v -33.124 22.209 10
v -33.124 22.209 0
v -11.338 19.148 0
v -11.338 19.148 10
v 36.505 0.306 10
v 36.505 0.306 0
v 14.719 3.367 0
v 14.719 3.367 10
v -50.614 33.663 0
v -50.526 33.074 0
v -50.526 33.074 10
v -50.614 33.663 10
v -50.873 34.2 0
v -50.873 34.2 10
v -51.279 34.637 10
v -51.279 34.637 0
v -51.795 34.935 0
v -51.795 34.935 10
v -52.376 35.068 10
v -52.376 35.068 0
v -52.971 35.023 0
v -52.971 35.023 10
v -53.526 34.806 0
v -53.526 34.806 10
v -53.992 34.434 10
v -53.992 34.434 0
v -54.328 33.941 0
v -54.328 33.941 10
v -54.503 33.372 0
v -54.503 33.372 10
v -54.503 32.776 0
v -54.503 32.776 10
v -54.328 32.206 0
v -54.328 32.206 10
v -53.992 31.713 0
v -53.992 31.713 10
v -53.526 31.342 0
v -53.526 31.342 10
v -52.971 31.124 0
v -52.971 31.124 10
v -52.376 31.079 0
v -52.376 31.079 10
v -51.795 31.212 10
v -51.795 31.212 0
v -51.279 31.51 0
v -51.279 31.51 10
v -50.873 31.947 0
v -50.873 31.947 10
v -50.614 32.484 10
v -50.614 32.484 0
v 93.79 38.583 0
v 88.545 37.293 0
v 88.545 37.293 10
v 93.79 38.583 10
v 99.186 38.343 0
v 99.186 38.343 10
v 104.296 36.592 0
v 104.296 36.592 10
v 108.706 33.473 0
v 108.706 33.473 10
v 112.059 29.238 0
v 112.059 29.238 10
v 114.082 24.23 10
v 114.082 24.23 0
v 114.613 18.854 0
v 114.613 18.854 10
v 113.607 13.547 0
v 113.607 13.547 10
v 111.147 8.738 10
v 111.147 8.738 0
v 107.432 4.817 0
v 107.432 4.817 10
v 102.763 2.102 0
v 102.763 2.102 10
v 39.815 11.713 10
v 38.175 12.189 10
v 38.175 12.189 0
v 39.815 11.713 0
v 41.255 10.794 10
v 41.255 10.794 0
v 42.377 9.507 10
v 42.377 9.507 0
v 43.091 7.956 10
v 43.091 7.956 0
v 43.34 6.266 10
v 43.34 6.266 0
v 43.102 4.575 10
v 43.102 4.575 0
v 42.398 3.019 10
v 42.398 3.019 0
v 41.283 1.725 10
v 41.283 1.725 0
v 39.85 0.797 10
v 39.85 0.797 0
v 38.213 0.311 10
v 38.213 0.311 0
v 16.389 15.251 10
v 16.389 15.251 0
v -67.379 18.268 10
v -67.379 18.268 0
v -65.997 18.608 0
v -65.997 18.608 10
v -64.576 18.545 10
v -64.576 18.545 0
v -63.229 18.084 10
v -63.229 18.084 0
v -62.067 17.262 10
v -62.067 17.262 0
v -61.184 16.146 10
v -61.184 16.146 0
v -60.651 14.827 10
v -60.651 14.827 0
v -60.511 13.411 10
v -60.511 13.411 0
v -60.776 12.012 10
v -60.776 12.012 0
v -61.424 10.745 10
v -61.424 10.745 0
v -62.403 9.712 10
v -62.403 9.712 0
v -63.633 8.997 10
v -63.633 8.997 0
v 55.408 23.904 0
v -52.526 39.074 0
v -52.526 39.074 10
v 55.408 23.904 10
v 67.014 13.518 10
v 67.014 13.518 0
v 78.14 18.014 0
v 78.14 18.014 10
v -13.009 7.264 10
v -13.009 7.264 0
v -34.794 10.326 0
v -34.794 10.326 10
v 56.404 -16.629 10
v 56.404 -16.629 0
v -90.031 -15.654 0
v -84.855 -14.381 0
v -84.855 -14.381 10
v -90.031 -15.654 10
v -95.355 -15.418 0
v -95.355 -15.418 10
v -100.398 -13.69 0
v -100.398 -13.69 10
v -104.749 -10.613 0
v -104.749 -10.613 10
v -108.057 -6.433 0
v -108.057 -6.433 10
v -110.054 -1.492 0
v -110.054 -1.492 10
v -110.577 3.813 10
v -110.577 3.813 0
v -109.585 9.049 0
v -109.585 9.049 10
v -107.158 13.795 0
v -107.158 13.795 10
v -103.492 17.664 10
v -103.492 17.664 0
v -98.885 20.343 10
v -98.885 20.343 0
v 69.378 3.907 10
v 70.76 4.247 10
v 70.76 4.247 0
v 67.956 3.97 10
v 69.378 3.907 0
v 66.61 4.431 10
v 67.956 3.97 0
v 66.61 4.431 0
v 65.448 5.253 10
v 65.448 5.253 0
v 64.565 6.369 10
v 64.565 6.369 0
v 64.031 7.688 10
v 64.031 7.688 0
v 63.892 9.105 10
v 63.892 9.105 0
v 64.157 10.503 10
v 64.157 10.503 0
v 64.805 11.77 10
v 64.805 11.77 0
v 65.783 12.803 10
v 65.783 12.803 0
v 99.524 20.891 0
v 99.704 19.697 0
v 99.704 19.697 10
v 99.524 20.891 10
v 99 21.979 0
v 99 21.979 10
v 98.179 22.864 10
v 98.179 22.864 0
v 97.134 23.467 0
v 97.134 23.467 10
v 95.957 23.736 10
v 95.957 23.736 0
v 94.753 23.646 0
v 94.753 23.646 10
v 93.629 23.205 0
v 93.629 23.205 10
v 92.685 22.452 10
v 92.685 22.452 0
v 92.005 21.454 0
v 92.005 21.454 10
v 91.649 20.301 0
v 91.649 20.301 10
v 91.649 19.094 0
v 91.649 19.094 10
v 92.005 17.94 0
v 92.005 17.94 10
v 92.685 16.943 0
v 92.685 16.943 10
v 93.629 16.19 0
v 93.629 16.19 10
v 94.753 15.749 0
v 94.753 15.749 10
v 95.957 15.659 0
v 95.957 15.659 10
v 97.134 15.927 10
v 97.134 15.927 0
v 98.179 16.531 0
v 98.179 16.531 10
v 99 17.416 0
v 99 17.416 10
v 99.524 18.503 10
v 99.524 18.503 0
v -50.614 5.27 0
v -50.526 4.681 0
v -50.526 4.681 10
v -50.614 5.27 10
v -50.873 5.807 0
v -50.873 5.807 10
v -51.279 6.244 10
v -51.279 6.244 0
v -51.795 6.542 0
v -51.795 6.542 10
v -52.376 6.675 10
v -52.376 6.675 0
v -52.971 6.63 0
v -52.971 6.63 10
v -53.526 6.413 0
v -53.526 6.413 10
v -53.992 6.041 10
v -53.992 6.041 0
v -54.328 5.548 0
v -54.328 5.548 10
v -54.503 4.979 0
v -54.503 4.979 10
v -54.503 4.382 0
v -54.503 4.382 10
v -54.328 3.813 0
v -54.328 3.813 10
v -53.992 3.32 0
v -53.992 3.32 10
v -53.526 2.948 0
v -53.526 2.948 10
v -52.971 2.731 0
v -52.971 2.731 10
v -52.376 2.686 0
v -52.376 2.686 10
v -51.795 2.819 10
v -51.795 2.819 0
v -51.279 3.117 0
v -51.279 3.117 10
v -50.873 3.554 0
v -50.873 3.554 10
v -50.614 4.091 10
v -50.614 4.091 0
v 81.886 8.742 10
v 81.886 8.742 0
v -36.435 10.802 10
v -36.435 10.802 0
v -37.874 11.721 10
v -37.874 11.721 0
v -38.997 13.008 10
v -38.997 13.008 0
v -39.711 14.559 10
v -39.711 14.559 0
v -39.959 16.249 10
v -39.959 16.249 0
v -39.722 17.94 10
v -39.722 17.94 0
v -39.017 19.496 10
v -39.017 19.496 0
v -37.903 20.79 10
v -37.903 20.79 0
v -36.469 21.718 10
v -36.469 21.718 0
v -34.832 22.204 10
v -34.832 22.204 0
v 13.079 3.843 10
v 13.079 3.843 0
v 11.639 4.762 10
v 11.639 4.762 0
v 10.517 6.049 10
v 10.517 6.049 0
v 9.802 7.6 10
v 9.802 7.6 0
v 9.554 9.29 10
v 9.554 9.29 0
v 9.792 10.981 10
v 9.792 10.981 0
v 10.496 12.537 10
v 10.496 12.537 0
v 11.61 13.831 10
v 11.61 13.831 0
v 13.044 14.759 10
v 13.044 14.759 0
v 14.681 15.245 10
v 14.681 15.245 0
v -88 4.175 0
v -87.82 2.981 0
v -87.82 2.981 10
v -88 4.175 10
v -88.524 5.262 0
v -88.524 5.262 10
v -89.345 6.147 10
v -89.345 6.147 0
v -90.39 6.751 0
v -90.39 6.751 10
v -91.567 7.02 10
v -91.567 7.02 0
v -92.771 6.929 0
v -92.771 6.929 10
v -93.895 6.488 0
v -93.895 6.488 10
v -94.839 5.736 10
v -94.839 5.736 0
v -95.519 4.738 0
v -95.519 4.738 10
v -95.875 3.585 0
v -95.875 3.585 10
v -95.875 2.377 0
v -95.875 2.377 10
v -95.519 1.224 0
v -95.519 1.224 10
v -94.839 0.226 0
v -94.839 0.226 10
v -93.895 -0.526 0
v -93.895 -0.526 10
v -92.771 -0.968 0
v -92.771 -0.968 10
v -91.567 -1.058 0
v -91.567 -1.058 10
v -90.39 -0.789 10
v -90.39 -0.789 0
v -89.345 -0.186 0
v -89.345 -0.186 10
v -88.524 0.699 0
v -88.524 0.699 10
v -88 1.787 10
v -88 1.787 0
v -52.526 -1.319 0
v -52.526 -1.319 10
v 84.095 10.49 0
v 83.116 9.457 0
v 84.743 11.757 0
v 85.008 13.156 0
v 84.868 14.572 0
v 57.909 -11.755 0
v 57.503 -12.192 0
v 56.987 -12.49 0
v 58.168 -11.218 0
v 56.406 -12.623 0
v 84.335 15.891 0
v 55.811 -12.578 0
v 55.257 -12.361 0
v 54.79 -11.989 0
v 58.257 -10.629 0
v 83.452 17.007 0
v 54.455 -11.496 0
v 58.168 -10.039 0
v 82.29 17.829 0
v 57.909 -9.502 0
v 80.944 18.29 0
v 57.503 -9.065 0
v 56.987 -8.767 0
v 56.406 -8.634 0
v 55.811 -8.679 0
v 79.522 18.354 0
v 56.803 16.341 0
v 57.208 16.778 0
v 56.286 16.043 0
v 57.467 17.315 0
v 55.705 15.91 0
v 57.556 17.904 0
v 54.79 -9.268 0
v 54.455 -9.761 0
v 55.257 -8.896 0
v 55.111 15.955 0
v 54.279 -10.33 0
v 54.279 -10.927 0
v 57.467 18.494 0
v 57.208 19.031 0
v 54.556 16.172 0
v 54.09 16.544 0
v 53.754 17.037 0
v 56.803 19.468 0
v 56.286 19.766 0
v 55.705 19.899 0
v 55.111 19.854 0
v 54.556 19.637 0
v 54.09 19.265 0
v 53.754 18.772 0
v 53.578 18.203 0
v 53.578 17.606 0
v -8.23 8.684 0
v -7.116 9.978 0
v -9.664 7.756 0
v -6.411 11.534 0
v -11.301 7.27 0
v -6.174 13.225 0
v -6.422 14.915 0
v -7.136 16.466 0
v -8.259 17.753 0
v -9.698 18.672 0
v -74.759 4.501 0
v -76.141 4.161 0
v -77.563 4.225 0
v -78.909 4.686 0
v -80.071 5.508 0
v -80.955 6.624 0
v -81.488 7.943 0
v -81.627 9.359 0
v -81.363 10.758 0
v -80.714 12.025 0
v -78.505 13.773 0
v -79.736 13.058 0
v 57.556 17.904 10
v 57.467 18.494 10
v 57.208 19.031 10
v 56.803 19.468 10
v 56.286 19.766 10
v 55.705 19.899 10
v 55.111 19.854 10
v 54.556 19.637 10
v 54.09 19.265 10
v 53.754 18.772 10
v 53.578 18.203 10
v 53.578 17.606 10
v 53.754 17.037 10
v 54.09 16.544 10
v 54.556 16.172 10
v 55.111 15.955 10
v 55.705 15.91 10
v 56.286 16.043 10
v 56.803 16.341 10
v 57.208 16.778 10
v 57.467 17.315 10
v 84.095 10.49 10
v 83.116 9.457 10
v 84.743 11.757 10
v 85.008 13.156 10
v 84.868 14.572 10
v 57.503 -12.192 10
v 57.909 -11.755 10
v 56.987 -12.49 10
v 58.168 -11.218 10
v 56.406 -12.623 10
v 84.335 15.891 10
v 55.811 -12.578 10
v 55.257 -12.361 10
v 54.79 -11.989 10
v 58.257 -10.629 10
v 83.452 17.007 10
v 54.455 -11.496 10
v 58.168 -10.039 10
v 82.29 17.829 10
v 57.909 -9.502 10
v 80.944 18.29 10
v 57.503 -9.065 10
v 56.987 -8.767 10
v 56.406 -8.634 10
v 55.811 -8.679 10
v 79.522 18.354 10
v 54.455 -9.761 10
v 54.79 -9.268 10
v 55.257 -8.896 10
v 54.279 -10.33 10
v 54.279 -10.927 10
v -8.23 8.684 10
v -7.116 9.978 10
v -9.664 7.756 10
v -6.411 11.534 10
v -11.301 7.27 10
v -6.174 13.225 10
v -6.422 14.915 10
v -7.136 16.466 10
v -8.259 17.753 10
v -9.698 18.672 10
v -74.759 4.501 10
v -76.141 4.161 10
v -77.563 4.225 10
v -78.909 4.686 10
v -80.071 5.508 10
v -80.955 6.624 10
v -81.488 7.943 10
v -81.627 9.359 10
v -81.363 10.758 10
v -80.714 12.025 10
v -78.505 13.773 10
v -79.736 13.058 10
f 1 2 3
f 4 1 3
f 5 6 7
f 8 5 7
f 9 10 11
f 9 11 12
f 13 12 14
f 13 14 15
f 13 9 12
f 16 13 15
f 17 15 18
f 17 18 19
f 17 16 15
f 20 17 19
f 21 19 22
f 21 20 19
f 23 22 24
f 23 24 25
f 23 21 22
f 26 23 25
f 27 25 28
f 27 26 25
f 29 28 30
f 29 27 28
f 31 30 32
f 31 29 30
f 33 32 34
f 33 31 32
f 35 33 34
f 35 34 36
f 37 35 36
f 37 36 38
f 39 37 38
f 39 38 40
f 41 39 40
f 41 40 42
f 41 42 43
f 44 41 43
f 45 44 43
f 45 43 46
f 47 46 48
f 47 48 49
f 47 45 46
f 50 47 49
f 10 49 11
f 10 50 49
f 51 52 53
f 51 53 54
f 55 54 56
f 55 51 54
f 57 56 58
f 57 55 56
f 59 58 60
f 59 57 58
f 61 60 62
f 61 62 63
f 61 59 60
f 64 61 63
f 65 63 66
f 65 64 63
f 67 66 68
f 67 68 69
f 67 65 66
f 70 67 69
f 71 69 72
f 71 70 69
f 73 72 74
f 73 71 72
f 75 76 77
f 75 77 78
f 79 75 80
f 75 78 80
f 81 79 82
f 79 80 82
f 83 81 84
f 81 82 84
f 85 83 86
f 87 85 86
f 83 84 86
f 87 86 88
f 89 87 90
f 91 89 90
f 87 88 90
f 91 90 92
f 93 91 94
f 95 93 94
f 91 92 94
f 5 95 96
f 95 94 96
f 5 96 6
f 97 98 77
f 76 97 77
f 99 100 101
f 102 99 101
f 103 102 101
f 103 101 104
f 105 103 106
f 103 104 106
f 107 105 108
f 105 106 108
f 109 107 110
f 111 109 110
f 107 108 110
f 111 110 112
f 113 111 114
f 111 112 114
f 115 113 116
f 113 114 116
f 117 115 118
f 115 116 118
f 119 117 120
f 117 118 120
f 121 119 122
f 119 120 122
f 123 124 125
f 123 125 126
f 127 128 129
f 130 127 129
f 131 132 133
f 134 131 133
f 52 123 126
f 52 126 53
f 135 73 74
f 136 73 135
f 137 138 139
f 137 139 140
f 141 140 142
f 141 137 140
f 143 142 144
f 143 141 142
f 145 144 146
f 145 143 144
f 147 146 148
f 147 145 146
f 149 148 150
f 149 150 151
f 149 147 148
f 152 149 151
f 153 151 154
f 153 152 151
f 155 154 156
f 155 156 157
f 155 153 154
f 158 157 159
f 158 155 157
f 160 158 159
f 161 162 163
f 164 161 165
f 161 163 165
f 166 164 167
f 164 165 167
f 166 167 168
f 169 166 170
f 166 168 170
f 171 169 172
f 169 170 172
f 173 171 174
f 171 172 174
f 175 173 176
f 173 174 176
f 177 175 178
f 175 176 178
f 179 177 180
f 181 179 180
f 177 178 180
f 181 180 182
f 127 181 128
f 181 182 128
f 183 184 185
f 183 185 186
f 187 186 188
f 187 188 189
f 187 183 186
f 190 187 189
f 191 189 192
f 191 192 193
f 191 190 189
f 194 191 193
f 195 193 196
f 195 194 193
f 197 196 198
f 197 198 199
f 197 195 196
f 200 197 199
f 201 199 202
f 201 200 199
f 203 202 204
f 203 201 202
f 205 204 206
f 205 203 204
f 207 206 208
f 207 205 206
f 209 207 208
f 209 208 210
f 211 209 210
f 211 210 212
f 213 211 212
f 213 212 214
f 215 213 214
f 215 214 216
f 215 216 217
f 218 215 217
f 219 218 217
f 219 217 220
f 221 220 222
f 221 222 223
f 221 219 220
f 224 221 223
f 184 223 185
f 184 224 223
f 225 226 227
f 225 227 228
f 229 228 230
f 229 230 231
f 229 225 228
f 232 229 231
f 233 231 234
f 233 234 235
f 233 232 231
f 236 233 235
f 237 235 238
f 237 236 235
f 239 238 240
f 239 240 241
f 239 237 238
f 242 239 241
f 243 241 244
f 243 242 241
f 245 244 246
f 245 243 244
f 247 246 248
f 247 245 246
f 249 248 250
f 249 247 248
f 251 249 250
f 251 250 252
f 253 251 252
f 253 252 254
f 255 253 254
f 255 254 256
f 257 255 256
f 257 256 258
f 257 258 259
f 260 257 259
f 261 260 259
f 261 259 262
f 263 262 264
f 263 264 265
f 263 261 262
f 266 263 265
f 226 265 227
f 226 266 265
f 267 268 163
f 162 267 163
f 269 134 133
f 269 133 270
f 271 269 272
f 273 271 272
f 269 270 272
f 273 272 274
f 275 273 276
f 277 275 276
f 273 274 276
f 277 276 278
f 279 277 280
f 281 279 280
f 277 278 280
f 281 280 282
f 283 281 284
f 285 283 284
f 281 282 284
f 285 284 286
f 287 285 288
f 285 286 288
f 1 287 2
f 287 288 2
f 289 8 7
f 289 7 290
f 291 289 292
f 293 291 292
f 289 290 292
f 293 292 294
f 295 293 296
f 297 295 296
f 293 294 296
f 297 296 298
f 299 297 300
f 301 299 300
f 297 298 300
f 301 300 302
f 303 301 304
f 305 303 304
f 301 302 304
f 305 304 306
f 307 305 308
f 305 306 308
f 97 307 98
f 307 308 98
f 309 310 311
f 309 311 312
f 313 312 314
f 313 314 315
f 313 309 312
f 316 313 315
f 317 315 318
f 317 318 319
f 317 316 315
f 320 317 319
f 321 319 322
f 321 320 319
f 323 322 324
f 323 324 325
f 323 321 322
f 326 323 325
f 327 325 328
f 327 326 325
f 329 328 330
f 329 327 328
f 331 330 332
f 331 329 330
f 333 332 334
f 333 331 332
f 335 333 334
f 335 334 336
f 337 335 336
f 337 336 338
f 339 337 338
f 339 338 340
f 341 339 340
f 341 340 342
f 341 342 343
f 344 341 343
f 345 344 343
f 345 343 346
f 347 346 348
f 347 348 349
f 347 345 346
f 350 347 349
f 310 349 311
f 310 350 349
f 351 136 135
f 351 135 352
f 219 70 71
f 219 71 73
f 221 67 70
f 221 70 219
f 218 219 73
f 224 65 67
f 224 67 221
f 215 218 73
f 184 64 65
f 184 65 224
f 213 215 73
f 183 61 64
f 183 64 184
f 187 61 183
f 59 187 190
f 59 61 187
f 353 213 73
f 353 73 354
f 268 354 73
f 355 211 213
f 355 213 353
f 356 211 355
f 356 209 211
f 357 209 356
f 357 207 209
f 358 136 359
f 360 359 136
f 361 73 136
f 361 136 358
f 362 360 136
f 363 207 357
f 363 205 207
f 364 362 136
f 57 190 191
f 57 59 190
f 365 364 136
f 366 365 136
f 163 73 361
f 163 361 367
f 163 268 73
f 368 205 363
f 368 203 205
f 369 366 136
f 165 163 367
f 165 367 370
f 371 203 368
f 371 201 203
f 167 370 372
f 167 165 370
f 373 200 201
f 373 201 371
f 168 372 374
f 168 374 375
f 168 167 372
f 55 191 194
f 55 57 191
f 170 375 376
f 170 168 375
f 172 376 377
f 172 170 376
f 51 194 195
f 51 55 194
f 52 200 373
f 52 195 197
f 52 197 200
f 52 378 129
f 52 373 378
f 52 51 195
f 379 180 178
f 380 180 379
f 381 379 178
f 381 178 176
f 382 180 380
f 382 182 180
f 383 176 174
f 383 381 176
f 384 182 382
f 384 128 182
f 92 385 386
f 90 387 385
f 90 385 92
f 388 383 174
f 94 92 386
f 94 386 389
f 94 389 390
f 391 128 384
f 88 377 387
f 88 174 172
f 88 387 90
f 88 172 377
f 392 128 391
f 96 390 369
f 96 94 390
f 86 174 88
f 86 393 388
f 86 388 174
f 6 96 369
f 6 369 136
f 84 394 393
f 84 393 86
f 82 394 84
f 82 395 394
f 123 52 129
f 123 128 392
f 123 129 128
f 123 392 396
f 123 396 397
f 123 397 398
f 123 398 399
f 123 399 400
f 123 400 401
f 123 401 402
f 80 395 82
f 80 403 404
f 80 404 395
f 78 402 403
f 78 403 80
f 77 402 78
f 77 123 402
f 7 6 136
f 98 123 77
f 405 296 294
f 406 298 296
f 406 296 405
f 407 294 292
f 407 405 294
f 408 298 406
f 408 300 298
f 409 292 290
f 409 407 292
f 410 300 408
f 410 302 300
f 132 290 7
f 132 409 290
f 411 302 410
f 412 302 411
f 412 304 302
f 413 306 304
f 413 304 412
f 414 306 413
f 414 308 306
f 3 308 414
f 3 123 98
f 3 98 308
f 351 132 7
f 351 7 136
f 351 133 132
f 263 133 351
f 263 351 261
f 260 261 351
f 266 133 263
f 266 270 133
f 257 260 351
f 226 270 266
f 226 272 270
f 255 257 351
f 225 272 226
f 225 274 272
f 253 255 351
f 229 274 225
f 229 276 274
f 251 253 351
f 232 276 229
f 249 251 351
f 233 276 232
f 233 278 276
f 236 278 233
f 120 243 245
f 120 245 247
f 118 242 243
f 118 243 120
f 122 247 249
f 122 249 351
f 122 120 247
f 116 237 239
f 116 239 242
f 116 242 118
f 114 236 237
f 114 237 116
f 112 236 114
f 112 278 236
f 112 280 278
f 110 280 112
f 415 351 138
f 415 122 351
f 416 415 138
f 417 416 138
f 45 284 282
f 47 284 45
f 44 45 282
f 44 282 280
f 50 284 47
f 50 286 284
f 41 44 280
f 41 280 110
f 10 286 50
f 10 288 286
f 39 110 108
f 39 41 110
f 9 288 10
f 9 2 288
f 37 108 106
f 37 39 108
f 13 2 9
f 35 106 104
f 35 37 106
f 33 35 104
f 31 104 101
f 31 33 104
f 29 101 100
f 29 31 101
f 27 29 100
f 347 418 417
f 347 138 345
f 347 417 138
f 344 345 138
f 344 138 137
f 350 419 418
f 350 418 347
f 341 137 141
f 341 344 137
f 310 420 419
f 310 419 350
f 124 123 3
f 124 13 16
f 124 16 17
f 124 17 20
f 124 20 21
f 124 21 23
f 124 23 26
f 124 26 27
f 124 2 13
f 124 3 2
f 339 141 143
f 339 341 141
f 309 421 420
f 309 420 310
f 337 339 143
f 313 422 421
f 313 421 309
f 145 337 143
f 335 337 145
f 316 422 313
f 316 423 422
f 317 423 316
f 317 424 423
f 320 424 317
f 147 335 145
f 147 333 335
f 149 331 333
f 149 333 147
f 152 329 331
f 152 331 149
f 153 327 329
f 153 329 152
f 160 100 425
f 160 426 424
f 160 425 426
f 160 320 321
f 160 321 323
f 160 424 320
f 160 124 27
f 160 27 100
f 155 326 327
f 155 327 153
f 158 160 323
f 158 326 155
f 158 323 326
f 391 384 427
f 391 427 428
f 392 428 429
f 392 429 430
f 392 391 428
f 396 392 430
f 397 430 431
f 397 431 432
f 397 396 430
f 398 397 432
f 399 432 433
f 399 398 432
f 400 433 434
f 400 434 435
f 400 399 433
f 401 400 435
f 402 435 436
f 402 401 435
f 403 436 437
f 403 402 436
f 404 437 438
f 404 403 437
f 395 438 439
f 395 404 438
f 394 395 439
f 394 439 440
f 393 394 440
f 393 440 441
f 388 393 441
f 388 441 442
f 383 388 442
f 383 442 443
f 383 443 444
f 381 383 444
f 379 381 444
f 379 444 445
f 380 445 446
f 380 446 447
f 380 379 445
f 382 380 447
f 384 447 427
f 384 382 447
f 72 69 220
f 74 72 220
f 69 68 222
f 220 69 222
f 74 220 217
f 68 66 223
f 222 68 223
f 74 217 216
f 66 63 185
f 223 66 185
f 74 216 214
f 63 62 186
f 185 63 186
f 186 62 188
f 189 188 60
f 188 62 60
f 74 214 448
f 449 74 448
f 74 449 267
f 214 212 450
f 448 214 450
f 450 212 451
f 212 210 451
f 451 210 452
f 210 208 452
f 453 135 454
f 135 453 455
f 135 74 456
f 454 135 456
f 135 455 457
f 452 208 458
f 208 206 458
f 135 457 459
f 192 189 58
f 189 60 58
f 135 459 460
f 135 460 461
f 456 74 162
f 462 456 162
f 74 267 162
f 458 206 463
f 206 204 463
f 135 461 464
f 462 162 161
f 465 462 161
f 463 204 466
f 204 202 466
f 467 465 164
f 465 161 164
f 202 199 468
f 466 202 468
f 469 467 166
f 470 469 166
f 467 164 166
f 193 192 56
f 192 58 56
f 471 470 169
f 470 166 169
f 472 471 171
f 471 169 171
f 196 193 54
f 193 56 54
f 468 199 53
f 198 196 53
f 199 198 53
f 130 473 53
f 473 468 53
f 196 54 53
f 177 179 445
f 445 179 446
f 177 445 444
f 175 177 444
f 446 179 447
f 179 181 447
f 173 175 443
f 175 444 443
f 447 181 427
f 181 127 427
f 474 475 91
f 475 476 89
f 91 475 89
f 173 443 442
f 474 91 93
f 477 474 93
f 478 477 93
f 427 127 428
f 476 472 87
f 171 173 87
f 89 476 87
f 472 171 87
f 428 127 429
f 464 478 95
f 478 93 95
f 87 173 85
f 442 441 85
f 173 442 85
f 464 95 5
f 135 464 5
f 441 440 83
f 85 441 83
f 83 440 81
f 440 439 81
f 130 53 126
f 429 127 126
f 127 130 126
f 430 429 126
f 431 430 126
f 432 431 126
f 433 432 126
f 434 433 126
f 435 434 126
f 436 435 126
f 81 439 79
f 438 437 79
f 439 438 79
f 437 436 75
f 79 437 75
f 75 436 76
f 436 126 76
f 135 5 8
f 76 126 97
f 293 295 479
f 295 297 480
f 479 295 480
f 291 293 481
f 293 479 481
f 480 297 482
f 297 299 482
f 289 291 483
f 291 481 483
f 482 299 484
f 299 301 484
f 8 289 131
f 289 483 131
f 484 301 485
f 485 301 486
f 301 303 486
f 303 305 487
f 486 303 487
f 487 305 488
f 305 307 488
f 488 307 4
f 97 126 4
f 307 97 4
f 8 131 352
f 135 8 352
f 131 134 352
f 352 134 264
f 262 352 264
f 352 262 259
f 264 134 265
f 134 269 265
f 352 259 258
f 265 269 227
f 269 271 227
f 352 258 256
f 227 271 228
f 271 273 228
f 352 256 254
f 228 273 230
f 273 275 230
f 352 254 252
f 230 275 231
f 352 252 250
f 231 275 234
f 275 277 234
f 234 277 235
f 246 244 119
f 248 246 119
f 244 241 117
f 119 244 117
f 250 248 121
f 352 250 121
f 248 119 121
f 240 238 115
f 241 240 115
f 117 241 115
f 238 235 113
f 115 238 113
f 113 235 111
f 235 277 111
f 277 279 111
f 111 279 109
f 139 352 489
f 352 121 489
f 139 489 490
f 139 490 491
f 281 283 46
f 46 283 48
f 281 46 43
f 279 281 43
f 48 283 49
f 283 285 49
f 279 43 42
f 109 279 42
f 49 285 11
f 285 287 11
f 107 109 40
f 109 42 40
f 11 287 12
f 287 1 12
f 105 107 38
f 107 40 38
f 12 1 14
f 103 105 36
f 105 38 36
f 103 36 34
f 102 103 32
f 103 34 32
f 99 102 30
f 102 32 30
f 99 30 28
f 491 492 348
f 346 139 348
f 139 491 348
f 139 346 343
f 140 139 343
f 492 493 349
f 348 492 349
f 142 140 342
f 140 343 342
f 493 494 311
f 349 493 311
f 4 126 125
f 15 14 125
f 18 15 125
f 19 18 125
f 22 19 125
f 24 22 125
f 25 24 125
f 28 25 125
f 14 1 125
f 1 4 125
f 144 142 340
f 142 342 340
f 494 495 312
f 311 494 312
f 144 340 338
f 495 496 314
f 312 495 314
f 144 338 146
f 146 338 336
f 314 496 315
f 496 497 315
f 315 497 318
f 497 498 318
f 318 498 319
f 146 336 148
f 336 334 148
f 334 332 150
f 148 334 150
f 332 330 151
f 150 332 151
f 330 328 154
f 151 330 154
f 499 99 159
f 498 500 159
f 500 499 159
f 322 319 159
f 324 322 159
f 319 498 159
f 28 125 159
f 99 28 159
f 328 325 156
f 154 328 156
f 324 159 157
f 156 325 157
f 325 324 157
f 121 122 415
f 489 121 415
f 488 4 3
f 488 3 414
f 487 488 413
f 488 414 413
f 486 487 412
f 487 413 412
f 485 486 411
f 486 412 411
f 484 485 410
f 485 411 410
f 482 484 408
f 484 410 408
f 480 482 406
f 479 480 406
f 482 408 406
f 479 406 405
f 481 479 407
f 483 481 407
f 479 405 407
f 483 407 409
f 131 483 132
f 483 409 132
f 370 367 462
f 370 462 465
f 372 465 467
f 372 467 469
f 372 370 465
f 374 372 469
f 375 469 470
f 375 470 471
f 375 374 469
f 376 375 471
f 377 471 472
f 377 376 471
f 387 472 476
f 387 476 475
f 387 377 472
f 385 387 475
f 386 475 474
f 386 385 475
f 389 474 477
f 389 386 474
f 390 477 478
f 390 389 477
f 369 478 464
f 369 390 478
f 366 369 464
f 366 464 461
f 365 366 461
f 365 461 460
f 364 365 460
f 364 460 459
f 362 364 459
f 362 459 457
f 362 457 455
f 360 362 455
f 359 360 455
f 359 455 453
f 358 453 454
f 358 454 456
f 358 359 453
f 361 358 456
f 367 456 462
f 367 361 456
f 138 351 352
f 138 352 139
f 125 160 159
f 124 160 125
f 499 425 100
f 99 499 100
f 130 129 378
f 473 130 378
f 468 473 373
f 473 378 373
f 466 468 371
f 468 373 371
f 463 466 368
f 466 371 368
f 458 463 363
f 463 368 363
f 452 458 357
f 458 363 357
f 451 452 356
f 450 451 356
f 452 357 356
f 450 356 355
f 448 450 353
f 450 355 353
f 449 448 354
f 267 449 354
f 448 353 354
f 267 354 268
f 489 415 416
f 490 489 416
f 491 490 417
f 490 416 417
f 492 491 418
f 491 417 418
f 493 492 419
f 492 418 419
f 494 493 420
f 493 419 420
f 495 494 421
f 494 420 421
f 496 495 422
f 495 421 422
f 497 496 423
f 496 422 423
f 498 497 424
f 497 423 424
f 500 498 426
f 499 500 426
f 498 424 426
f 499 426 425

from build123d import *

# Parameters (mm, degrees)
SKETCH2_R           = 4.05
SKETCH2_R_2         = 2
BOSS_EXTRUDE1_DEPTH = 10


with BuildPart() as part:
    # Sketch2 → Boss-Extrude1 (new body)
    with BuildSketch(Plane.XY):
        with BuildLine():
            Line((-52.525602652, 39.073613719), (55.40832582, 23.904489319))
            Line((55.40832582, 23.904489319), (88.545070057, 37.292603029))
            ThreePointArc((88.545070057, 37.292603029), (113.24947567, 26.806204997), (102.763077638, 2.101799383))
            Line((102.763077638, 2.101799383), (56.40388491, -16.628530288))
            Line((56.40388491, -16.628530288), (-52.525602652, -1.319489182))
            Line((-52.525602652, -1.319489182), (-84.855091861, -14.38145069))
            ThreePointArc((-84.855091861, -14.38145069), (-109.23231099, -4.033935081), (-98.88479538, 20.343284048))
            Line((-98.88479538, 20.343284048), (-52.525602652, 39.073613719))
        make_face()
        with Locations((-91.869943621, 2.980916679)):
            Circle(SKETCH2_R, mode=Mode.SUBTRACT)
        with Locations((95.654073847, 19.697201206)):
            Circle(SKETCH2_R, mode=Mode.SUBTRACT)
        with Locations((-52.525602652, 33.073613719)):
            Circle(SKETCH2_R_2, mode=Mode.SUBTRACT)
        with Locations((55.555695905, 17.904489319)):
            Circle(SKETCH2_R_2, mode=Mode.SUBTRACT)
        with Locations((-52.525602652, 4.680510818)):
            Circle(SKETCH2_R_2, mode=Mode.SUBTRACT)
        with Locations((56.256514825, -10.628530288)):
            Circle(SKETCH2_R_2, mode=Mode.SUBTRACT)
        with BuildLine():
            Line((-33.124360513, 22.209360939), (-11.338463, 19.147552718))
            ThreePointArc((-11.338463, 19.147552718), (-6.231893194, 12.3709057), (-13.008540212, 7.264335893))
            Line((-13.008540212, 7.264335893), (-34.794437724, 10.326144114))
            ThreePointArc((-34.794437724, 10.326144114), (-39.901007531, 17.102791132), (-33.124360513, 22.209360939))
        make_face(mode=Mode.SUBTRACT)
        with BuildLine():
            Line((-78.505415838, 13.773210112), (-67.379209583, 18.268489233))
            ThreePointArc((-67.379209583, 18.268489233), (-60.870257343, 15.505602928), (-63.633143649, 8.996650688))
            Line((-63.633143649, 8.996650688), (-74.759349904, 4.501371567))
            ThreePointArc((-74.759349904, 4.501371567), (-81.268302144, 7.264257873), (-78.505415838, 13.773210112))
        make_face(mode=Mode.SUBTRACT)
        with BuildLine():
            Line((67.013646361, 13.518391096), (78.139852616, 18.013670217))
            ThreePointArc((78.139852616, 18.013670217), (84.648804856, 15.250783911), (81.88591855, 8.741831672))
            Line((81.88591855, 8.741831672), (70.759712296, 4.246552551))
            ThreePointArc((70.759712296, 4.246552551), (64.250760056, 7.009438856), (67.013646361, 13.518391096))
        make_face(mode=Mode.SUBTRACT)
        with BuildLine():
            Line((16.389042924, 15.250705891), (38.174940437, 12.18889767))
            ThreePointArc((38.174940437, 12.18889767), (43.281510244, 5.412250652), (36.504863225, 0.305680845))
            Line((36.504863225, 0.305680845), (14.718965713, 3.367489066))
            ThreePointArc((14.718965713, 3.367489066), (9.612395906, 10.144136084), (16.389042924, 15.250705891))
        make_face(mode=Mode.SUBTRACT)
    extrude(amount=BOSS_EXTRUDE1_DEPTH)


solid = part.part
